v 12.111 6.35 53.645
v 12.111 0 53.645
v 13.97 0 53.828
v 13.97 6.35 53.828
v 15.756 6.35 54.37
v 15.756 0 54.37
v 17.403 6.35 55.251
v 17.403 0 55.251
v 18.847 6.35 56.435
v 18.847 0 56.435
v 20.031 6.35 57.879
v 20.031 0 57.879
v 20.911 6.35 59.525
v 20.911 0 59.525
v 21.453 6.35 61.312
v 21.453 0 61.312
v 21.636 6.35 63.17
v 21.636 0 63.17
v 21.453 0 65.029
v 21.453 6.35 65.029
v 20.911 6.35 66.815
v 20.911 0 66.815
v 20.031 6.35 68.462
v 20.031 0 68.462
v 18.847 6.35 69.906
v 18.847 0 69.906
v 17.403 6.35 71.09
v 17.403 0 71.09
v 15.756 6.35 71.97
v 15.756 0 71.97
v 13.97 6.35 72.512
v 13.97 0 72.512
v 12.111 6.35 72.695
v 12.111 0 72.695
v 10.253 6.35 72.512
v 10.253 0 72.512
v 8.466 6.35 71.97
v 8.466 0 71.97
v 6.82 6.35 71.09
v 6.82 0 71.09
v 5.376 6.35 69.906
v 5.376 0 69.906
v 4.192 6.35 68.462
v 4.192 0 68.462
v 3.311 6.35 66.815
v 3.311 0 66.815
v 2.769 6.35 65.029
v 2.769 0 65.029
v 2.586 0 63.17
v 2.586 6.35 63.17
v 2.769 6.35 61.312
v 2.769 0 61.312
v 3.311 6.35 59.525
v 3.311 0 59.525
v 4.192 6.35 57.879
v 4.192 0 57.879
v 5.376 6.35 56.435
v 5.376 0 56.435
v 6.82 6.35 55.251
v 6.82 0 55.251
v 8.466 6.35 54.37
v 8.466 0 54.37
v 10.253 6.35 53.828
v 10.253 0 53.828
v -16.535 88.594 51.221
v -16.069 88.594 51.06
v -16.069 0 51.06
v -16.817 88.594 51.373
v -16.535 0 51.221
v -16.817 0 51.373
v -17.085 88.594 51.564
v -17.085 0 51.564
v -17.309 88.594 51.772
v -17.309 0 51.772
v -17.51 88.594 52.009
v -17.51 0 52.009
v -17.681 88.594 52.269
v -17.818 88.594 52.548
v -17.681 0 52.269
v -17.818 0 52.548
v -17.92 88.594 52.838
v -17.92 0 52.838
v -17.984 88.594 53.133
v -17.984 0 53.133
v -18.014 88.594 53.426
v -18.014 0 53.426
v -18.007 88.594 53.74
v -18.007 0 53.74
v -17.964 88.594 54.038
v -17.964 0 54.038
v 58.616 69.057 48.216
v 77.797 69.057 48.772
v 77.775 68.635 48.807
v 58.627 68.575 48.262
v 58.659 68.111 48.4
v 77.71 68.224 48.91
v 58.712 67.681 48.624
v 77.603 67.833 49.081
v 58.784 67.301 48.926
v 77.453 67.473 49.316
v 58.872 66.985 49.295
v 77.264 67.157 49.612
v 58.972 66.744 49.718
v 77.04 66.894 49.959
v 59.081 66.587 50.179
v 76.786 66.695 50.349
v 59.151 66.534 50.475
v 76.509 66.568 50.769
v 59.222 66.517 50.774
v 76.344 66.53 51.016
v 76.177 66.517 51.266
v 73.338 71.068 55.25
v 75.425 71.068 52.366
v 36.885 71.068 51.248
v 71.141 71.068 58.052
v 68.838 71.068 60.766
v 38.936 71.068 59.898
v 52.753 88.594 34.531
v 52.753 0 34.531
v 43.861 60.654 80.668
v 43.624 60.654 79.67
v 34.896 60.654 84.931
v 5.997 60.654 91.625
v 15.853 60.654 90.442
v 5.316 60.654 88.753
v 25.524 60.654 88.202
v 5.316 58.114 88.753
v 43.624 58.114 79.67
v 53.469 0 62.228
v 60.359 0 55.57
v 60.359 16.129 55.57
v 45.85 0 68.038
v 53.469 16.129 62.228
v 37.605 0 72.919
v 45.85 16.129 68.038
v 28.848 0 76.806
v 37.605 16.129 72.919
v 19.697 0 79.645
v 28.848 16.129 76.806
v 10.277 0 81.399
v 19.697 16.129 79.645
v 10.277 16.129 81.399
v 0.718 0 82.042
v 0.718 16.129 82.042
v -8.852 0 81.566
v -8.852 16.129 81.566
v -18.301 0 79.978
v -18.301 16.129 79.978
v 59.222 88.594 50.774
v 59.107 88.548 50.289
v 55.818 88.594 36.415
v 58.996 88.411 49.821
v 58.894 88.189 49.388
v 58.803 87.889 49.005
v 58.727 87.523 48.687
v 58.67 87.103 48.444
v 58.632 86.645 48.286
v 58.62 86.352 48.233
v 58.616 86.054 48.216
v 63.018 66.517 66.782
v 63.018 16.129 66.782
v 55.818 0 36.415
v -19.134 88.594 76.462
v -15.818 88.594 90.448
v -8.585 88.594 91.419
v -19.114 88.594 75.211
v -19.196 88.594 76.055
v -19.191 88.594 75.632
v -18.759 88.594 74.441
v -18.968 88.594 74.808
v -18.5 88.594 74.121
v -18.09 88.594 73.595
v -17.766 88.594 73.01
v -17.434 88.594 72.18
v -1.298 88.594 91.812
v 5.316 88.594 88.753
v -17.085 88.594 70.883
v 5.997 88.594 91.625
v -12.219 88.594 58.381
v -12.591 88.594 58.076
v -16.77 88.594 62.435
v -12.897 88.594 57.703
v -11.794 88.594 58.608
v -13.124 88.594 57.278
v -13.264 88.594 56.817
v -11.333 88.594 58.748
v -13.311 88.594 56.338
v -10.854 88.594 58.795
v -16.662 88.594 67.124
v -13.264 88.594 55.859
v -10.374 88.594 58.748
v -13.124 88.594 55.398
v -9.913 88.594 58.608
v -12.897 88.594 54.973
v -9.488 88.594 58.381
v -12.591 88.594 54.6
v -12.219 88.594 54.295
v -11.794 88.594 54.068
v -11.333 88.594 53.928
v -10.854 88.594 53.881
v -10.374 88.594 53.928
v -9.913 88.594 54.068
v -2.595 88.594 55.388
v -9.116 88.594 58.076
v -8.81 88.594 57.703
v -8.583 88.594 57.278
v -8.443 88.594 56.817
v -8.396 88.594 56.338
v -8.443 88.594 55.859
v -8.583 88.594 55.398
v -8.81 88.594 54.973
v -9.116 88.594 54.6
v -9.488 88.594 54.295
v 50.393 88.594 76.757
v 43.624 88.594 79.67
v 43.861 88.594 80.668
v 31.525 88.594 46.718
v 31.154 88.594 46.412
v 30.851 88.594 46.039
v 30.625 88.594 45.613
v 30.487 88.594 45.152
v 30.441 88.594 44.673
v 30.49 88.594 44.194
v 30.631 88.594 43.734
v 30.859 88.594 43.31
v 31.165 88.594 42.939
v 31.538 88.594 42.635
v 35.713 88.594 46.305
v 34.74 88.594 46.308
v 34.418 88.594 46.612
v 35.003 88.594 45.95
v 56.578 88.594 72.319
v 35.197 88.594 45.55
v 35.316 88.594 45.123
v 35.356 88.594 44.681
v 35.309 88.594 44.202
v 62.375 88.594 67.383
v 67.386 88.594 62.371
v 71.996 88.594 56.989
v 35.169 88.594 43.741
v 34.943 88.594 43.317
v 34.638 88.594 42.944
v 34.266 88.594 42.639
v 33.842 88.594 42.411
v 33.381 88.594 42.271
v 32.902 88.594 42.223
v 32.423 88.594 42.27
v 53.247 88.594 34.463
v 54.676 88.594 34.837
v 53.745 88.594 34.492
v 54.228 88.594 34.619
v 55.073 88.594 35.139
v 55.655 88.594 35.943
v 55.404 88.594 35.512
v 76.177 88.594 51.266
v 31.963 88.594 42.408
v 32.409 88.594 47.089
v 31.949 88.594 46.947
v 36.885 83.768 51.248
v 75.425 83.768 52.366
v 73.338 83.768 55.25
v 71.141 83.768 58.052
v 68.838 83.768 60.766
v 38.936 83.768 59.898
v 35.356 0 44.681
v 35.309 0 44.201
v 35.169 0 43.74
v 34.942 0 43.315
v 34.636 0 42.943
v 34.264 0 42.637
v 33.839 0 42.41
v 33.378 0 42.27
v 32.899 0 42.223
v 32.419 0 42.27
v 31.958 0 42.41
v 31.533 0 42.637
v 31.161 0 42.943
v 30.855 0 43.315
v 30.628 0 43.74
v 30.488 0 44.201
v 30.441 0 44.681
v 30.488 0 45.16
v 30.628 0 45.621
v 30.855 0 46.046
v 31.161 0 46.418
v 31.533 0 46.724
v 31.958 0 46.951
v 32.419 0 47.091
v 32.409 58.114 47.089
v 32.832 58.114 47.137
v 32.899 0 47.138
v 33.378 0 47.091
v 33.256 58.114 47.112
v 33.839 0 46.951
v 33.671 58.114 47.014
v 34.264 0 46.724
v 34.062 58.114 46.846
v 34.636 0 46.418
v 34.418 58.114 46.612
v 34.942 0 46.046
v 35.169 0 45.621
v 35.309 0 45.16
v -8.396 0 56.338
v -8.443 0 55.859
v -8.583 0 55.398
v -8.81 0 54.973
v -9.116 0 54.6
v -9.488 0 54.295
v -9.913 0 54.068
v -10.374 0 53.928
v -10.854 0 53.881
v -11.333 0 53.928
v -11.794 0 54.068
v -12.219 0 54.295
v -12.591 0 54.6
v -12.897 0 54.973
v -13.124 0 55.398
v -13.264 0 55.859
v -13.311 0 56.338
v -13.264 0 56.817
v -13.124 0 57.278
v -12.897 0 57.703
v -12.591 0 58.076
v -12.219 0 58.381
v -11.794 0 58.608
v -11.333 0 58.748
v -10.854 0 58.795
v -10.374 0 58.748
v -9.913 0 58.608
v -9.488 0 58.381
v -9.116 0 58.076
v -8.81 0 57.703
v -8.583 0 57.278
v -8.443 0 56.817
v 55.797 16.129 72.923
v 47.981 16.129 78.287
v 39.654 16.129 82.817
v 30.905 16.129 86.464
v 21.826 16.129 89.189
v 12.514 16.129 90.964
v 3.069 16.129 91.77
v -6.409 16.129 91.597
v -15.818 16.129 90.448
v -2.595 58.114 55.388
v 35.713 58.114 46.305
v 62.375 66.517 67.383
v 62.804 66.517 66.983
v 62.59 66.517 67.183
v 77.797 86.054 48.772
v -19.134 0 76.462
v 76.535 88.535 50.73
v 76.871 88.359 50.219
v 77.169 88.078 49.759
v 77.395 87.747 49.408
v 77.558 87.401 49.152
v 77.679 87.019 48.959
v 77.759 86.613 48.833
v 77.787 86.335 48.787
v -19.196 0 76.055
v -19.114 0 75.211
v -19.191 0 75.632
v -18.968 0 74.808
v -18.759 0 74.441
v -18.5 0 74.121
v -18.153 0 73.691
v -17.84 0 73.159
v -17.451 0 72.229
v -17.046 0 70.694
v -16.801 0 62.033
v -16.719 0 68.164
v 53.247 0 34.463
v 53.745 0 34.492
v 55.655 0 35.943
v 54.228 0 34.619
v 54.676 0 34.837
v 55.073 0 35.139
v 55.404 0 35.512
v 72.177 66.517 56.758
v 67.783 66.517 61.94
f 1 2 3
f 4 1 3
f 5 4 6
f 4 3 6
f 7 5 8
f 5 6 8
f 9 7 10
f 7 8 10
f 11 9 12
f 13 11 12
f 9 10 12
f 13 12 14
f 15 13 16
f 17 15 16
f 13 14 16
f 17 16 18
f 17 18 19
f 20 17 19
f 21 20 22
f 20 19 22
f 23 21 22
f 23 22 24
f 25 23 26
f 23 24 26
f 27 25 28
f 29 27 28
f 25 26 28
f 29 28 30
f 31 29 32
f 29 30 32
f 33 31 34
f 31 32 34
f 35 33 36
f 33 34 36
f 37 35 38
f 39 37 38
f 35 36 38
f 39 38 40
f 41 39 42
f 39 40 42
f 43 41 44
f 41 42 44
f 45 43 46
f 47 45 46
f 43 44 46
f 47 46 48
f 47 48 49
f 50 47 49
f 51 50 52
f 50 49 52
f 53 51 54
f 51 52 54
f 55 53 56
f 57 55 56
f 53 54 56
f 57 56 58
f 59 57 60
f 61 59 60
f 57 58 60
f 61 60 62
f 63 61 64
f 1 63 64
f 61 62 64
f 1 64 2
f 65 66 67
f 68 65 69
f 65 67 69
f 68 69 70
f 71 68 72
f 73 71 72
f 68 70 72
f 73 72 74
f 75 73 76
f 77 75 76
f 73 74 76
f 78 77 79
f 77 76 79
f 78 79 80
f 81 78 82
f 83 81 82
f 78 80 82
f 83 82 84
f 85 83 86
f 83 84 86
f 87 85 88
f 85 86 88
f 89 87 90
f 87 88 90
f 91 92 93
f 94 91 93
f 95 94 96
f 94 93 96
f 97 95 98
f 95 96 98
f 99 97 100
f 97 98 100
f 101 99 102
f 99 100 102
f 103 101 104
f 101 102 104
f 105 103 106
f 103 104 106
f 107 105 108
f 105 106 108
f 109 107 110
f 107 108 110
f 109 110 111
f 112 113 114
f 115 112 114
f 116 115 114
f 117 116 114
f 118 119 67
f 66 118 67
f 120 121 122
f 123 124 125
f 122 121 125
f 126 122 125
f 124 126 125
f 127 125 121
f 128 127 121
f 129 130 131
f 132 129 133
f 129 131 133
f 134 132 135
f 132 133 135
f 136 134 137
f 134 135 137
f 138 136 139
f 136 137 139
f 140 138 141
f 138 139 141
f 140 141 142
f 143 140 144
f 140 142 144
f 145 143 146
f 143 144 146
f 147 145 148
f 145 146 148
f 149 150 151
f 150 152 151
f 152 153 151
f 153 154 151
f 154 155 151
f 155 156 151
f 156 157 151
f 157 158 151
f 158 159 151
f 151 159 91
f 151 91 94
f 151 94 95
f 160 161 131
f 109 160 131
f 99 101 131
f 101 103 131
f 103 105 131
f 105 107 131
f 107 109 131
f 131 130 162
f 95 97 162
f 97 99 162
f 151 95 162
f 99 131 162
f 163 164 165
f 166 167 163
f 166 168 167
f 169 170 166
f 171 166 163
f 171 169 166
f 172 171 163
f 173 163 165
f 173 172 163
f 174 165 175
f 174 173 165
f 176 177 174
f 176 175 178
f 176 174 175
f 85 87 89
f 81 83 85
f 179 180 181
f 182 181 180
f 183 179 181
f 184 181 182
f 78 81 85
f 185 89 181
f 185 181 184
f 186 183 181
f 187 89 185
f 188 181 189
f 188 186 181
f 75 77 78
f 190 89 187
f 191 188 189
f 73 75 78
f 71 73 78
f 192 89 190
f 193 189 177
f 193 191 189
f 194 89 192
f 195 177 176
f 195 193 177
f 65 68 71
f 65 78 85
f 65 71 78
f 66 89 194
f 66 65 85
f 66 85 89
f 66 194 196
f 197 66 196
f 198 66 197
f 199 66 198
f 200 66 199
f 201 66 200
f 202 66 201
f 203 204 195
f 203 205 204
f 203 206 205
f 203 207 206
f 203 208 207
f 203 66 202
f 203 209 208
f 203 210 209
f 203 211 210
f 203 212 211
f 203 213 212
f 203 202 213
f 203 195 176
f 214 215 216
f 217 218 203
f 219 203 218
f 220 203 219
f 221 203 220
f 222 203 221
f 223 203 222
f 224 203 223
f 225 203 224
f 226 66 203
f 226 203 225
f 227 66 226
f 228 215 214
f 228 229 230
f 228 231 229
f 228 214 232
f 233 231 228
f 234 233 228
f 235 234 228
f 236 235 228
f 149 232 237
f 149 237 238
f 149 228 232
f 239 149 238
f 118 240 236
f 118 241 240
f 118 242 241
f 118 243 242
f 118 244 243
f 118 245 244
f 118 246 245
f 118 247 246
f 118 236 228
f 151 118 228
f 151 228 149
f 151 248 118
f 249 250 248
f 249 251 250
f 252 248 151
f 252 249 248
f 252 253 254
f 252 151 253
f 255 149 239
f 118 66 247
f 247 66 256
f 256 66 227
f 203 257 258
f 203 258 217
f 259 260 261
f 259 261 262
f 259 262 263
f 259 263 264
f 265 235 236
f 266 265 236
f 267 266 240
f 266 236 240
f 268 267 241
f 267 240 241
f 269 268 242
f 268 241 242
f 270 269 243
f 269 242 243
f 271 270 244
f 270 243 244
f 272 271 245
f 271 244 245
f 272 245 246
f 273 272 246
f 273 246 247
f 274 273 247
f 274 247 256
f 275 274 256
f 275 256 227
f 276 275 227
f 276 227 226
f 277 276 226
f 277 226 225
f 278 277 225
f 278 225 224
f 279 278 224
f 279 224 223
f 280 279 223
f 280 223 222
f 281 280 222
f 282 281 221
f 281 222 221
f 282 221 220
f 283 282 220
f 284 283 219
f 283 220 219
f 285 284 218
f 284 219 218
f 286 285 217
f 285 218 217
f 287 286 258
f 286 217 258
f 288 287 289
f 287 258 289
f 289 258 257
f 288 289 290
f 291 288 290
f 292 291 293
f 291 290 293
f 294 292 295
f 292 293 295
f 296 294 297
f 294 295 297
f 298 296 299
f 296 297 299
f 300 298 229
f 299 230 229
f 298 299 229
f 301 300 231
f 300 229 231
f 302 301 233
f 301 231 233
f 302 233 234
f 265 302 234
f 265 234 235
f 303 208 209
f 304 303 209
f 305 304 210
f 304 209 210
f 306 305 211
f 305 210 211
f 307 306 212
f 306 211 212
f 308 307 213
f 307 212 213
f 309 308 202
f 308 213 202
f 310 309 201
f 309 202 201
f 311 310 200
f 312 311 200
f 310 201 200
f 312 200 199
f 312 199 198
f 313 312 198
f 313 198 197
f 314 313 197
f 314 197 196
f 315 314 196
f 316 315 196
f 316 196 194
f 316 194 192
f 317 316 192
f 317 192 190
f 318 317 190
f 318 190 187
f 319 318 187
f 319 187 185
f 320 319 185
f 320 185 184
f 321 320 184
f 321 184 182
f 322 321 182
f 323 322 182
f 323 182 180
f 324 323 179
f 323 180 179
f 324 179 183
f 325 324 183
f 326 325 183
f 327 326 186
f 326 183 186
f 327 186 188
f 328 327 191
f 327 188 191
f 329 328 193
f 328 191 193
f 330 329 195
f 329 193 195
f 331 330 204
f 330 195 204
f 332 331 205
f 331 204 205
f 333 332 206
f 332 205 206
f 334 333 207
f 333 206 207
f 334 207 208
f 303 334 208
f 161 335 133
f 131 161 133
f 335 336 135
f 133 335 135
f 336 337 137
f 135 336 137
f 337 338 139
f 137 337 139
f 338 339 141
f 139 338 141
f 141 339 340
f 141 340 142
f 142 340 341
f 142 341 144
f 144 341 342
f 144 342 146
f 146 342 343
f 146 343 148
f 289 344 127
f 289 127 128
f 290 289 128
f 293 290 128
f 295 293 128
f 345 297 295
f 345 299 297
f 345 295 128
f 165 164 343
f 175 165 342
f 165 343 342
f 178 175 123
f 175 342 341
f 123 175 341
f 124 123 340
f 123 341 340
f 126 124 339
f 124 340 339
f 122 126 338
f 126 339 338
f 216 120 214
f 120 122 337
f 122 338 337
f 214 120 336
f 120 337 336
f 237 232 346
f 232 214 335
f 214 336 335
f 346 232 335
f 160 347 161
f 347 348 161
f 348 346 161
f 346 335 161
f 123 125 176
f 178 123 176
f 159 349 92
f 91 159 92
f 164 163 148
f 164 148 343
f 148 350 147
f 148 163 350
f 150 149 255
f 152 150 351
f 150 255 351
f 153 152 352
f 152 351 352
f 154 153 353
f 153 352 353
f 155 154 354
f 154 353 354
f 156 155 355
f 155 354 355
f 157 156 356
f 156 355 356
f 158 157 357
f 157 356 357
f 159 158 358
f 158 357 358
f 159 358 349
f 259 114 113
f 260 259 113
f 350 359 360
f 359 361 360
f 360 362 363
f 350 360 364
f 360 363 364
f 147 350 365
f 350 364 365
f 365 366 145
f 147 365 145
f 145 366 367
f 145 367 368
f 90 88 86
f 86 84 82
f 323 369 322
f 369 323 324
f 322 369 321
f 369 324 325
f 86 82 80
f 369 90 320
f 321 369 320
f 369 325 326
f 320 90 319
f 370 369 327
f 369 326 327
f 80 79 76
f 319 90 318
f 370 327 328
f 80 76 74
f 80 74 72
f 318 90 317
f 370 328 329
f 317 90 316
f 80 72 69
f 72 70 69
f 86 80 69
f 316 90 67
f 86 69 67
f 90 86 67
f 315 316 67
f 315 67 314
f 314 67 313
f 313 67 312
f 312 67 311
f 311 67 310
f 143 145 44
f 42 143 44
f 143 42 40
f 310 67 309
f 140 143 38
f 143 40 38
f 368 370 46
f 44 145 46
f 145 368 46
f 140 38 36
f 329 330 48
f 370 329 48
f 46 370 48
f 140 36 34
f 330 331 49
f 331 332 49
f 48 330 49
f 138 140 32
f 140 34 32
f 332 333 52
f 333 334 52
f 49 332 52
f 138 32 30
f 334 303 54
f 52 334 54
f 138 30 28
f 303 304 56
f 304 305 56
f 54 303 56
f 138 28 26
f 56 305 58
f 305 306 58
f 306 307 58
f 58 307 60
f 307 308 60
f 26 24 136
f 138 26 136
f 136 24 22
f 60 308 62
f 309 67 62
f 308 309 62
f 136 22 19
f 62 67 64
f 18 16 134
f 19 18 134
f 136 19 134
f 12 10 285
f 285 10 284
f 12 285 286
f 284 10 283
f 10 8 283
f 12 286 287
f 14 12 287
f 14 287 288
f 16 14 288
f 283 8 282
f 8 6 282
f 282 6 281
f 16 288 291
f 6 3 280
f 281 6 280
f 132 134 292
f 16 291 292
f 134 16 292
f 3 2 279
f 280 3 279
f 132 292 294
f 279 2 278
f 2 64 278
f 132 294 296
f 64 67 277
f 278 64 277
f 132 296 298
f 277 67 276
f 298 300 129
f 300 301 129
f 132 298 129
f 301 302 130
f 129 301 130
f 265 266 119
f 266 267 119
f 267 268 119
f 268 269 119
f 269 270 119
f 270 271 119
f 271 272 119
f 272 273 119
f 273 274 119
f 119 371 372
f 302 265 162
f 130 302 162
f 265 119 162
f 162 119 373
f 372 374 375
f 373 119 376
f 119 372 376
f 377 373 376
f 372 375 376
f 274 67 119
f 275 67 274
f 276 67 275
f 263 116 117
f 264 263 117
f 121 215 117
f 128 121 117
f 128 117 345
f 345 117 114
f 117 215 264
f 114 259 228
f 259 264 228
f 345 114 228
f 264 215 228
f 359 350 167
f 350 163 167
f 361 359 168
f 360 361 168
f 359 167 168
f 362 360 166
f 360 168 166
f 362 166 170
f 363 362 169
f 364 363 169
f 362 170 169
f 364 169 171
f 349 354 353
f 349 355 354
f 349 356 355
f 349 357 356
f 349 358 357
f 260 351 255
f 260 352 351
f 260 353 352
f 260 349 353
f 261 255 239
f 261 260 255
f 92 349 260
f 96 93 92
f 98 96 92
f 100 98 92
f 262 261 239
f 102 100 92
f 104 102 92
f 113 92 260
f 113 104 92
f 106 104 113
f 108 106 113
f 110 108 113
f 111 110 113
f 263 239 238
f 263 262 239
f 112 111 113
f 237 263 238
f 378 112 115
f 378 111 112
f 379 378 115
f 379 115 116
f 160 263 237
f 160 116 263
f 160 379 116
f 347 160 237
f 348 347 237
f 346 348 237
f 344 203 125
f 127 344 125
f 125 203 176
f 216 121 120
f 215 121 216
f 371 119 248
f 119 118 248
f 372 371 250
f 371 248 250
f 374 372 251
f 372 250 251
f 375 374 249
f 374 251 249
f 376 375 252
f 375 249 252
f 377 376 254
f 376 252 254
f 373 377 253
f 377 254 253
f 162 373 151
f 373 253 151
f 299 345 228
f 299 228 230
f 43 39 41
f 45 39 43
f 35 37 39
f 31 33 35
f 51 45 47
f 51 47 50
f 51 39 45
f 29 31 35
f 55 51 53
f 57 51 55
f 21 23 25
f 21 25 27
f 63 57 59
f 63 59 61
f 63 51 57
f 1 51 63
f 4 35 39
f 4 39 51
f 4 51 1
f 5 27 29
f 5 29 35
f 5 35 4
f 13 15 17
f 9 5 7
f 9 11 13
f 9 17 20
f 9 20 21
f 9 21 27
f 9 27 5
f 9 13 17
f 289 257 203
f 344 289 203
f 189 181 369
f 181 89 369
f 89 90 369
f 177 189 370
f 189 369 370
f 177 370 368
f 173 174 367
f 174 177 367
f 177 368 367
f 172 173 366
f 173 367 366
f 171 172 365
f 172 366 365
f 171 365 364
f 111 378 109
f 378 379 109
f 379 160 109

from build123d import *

# Parameters (mm, degrees)
BOSS_EXTRUDE1_DEPTH          = 88.5939681
CUT_EXTRUDE5_DEPTH           = 30.48
SKETCH13_W                   = 39.37
SKETCH13_H                   = 27.94
CUT_EXTRUDE6_DEPTH           = 121.173808566
SKETCH17_W                   = 9.779
SKETCH17_H                   = 16.129
SKETCH20_W                   = 22.076995977
SKETCH20_H                   = 19.05
BOSS_EXTRUDE2_DEPTH          = 43.18
CUT_EXTRUDE9_START           = -22.076995977
CUT_EXTRUDE9_DEPTH           = 22.076995977
FILLET2_R                    = 2.54
CUT_EXTRUDE11_DEPTH          = 150.440180481
F_10_0_1935_DIAMETER_HOLE1_D = 4.9149
CUT_EXTRUDE14_DEPTH          = 12.7
FILLET5_R                    = 2.54
SKETCH31_RX                  = 22.225
SKETCH31_RY                  = 6.35
CUT_EXTRUDE16_DEPTH          = 150.440180481
FILLET6_R                    = 2.54
SKETCH32_R                   = 9.525
CUT_EXTRUDE17_DEPTH          = 6.35


# Read off the part's stored shape, not the designer's step: Cut-Extrude9
with BuildPart() as part:
    # Sketch1 → Boss-Extrude1 (new body)
    with BuildSketch(Plane(origin=(0, 0, 0), x_dir=(1, 0, 0), z_dir=(0, 1, 0))):
        with BuildLine():
            Line((63.017839503, -66.782093), (53.468205472, -26.506342671))
            Line((53.468205472, -26.506342671), (-35.875703335, -47.690346072))
            Line((-35.875703335, -47.690346072), (-26.326069304, -87.966096401))
            ThreePointArc((-26.326069304, -87.966096401), (21.184003401, -89.343908807), (63.017839503, -66.782093))
        make_face()
    extrude(amount=BOSS_EXTRUDE1_DEPTH)

    # Sketch12 → Cut-Extrude5 (cut)
    with BuildSketch(Plane(origin=(0, 88.5939681, 0), x_dir=(1, 0, 0), z_dir=(0, 1, 0))):
        Polygon((5.316172436, -88.753304237), (43.624072478, -79.670259902), (35.713033863, -46.305314704), (-2.594866179, -55.388359039), align=None)
    extrude(amount=-CUT_EXTRUDE5_DEPTH, mode=Mode.SUBTRACT)

    # Sketch13 → Cut-Extrude6 (cut, through all)
    with BuildSketch(Plane(origin=(20.206823904, 0, 85.222637004), x_dir=(-0.9730226071044289, 0, 0.23070978753338656), z_dir=(-0.23070978753338653, 0, -0.9730226071044288))):
        with Locations((-4.3815, 74.6239681)):
            Rectangle(SKETCH13_W, SKETCH13_H)
    extrude(amount=-CUT_EXTRUDE6_DEPTH, mode=Mode.SUBTRACT)

    # Sketch17 → Cut-Revolve1 (revolve, cut)
    with BuildSketch(Plane(origin=(0, 0, 0), x_dir=(0.2779727925443418, 0, 0.9605889477841708), z_dir=(-0.9605889477841708, 0, 0.2779727925443418))):
        with Locations((86.934262311, 8.0645)):
            Rectangle(SKETCH17_W, SKETCH17_H)
    revolve(axis=Axis((0, 88.5939681, 0), (0, -1, 0)), mode=Mode.SUBTRACT)

    # Sketch20 → Boss-Extrude2 (add)
    with BuildSketch(Plane(origin=(46.161246838, 0, 1.33869588), x_dir=(0, -1, 0), z_dir=(0.9995797526704859, 0, 0.02898823987775881))):
        with Locations((-77.555470112, -56.021383933)):
            Rectangle(SKETCH20_W, SKETCH20_H)
    extrude(amount=BOSS_EXTRUDE2_DEPTH)

    # Cut-Extrude9 outline → Cut-Extrude9 (cut)
    with BuildSketch(Plane(origin=(0, 88.5939681, 0), x_dir=(1, 0, 0), z_dir=(0, 1, 0)).offset(CUT_EXTRUDE9_START)):
        with BuildLine():
            Line((87.975252227, -49.06725203), (77.797045472, -48.772079686))
            ThreePointArc((77.797045472, -48.772079686), (70.701096399, -58.587123236), (62.37506144, -67.382844638))
            Line((62.37506144, -67.382844638), (87.423026258, -68.109246318))
            Line((87.423026258, -68.109246318), (87.975252227, -49.06725203))
        make_face()
    extrude(amount=CUT_EXTRUDE9_DEPTH, mode=Mode.SUBTRACT)

    # Fillet2
    fillet2_edges = [part.edges().sort_by_distance(p)[0] for p in [
        (68.206351325, 66.516972123, 48.493945458),
        (68.206351325, 88.5939681, 48.493945458),
        (-35.875703335, 44.29698405, 47.690346072),
        (53.468205472, 44.29698405, 26.506342671),
    ]]
    fillet(fillet2_edges, radius=FILLET2_R)

    # Sketch25 → Cut-Extrude11 (cut, through all)
    with BuildSketch(Plane.XZ):
        Polygon((-24.667480264, 53.125115211), (-13.767913037, 99.094232658), (-26.000188569, 101.994582217), (-40.190153369, 42.148154842), (65.286931214, 17.138873869), (68.442798797, 30.762859127), align=None)
    extrude(amount=-CUT_EXTRUDE11_DEPTH, mode=Mode.SUBTRACT)

    # #10 (0.1935) Diameter Hole1 (through all)
    with Locations(Plane(origin=(0, 0, 0), x_dir=(-1, 0, 0), z_dir=(0, -1, 0))):
        with Locations((10.85357172, -56.338005803), (-32.898719503, -44.680648661)):
            Hole(F_10_0_1935_DIAMETER_HOLE1_D / 2)

    # Sketch30 → Cut-Extrude14 (cut)
    with BuildSketch(Plane(origin=(0, 71.0679681, 0), x_dir=(1, 0, 0), z_dir=(0, 1, 0))):
        Polygon((30.706346029, -52.713276699), (36.885039584, -51.248269548), (81.505966291, -52.542295486), (81.257041939, -61.125767384), (38.936049595, -59.898440526), (32.75735604, -61.363447676), align=None)
    extrude(amount=CUT_EXTRUDE14_DEPTH, mode=Mode.SUBTRACT)

    # Fillet5
    fillet5_edges = [part.edges().sort_by_distance(p)[0] for p in [
        (55.229871942, 44.29698405, 33.936202145),
    ]]
    fillet(fillet5_edges, radius=FILLET5_R)

    # Sketch31 → Cut-Extrude16 (cut, through all)
    with BuildSketch(Plane.XZ):
        with Locations(Location((-24.667480264, 53.125115211), (0, 0, 76.661136503))):
            Ellipse(SKETCH31_RX, SKETCH31_RY)
    extrude(amount=-CUT_EXTRUDE16_DEPTH, mode=Mode.SUBTRACT)

    # Fillet6
    fillet6_edges = [part.edges().sort_by_distance(p)[0] for p in [
        (-18.49303476, 44.29698405, 51.642201263),
        (-19.539955236, 44.29698405, 74.750542654),
    ]]
    fillet(fillet6_edges, radius=FILLET6_R)

    # Sketch32 → Cut-Extrude17 (cut)
    with BuildSketch(Plane.XZ):
        with Locations(Location((12.111377962, 63.170347591, 0), (0, 0, 270))):
            Circle(SKETCH32_R)
    extrude(amount=-CUT_EXTRUDE17_DEPTH, mode=Mode.SUBTRACT)


solid = part.part
